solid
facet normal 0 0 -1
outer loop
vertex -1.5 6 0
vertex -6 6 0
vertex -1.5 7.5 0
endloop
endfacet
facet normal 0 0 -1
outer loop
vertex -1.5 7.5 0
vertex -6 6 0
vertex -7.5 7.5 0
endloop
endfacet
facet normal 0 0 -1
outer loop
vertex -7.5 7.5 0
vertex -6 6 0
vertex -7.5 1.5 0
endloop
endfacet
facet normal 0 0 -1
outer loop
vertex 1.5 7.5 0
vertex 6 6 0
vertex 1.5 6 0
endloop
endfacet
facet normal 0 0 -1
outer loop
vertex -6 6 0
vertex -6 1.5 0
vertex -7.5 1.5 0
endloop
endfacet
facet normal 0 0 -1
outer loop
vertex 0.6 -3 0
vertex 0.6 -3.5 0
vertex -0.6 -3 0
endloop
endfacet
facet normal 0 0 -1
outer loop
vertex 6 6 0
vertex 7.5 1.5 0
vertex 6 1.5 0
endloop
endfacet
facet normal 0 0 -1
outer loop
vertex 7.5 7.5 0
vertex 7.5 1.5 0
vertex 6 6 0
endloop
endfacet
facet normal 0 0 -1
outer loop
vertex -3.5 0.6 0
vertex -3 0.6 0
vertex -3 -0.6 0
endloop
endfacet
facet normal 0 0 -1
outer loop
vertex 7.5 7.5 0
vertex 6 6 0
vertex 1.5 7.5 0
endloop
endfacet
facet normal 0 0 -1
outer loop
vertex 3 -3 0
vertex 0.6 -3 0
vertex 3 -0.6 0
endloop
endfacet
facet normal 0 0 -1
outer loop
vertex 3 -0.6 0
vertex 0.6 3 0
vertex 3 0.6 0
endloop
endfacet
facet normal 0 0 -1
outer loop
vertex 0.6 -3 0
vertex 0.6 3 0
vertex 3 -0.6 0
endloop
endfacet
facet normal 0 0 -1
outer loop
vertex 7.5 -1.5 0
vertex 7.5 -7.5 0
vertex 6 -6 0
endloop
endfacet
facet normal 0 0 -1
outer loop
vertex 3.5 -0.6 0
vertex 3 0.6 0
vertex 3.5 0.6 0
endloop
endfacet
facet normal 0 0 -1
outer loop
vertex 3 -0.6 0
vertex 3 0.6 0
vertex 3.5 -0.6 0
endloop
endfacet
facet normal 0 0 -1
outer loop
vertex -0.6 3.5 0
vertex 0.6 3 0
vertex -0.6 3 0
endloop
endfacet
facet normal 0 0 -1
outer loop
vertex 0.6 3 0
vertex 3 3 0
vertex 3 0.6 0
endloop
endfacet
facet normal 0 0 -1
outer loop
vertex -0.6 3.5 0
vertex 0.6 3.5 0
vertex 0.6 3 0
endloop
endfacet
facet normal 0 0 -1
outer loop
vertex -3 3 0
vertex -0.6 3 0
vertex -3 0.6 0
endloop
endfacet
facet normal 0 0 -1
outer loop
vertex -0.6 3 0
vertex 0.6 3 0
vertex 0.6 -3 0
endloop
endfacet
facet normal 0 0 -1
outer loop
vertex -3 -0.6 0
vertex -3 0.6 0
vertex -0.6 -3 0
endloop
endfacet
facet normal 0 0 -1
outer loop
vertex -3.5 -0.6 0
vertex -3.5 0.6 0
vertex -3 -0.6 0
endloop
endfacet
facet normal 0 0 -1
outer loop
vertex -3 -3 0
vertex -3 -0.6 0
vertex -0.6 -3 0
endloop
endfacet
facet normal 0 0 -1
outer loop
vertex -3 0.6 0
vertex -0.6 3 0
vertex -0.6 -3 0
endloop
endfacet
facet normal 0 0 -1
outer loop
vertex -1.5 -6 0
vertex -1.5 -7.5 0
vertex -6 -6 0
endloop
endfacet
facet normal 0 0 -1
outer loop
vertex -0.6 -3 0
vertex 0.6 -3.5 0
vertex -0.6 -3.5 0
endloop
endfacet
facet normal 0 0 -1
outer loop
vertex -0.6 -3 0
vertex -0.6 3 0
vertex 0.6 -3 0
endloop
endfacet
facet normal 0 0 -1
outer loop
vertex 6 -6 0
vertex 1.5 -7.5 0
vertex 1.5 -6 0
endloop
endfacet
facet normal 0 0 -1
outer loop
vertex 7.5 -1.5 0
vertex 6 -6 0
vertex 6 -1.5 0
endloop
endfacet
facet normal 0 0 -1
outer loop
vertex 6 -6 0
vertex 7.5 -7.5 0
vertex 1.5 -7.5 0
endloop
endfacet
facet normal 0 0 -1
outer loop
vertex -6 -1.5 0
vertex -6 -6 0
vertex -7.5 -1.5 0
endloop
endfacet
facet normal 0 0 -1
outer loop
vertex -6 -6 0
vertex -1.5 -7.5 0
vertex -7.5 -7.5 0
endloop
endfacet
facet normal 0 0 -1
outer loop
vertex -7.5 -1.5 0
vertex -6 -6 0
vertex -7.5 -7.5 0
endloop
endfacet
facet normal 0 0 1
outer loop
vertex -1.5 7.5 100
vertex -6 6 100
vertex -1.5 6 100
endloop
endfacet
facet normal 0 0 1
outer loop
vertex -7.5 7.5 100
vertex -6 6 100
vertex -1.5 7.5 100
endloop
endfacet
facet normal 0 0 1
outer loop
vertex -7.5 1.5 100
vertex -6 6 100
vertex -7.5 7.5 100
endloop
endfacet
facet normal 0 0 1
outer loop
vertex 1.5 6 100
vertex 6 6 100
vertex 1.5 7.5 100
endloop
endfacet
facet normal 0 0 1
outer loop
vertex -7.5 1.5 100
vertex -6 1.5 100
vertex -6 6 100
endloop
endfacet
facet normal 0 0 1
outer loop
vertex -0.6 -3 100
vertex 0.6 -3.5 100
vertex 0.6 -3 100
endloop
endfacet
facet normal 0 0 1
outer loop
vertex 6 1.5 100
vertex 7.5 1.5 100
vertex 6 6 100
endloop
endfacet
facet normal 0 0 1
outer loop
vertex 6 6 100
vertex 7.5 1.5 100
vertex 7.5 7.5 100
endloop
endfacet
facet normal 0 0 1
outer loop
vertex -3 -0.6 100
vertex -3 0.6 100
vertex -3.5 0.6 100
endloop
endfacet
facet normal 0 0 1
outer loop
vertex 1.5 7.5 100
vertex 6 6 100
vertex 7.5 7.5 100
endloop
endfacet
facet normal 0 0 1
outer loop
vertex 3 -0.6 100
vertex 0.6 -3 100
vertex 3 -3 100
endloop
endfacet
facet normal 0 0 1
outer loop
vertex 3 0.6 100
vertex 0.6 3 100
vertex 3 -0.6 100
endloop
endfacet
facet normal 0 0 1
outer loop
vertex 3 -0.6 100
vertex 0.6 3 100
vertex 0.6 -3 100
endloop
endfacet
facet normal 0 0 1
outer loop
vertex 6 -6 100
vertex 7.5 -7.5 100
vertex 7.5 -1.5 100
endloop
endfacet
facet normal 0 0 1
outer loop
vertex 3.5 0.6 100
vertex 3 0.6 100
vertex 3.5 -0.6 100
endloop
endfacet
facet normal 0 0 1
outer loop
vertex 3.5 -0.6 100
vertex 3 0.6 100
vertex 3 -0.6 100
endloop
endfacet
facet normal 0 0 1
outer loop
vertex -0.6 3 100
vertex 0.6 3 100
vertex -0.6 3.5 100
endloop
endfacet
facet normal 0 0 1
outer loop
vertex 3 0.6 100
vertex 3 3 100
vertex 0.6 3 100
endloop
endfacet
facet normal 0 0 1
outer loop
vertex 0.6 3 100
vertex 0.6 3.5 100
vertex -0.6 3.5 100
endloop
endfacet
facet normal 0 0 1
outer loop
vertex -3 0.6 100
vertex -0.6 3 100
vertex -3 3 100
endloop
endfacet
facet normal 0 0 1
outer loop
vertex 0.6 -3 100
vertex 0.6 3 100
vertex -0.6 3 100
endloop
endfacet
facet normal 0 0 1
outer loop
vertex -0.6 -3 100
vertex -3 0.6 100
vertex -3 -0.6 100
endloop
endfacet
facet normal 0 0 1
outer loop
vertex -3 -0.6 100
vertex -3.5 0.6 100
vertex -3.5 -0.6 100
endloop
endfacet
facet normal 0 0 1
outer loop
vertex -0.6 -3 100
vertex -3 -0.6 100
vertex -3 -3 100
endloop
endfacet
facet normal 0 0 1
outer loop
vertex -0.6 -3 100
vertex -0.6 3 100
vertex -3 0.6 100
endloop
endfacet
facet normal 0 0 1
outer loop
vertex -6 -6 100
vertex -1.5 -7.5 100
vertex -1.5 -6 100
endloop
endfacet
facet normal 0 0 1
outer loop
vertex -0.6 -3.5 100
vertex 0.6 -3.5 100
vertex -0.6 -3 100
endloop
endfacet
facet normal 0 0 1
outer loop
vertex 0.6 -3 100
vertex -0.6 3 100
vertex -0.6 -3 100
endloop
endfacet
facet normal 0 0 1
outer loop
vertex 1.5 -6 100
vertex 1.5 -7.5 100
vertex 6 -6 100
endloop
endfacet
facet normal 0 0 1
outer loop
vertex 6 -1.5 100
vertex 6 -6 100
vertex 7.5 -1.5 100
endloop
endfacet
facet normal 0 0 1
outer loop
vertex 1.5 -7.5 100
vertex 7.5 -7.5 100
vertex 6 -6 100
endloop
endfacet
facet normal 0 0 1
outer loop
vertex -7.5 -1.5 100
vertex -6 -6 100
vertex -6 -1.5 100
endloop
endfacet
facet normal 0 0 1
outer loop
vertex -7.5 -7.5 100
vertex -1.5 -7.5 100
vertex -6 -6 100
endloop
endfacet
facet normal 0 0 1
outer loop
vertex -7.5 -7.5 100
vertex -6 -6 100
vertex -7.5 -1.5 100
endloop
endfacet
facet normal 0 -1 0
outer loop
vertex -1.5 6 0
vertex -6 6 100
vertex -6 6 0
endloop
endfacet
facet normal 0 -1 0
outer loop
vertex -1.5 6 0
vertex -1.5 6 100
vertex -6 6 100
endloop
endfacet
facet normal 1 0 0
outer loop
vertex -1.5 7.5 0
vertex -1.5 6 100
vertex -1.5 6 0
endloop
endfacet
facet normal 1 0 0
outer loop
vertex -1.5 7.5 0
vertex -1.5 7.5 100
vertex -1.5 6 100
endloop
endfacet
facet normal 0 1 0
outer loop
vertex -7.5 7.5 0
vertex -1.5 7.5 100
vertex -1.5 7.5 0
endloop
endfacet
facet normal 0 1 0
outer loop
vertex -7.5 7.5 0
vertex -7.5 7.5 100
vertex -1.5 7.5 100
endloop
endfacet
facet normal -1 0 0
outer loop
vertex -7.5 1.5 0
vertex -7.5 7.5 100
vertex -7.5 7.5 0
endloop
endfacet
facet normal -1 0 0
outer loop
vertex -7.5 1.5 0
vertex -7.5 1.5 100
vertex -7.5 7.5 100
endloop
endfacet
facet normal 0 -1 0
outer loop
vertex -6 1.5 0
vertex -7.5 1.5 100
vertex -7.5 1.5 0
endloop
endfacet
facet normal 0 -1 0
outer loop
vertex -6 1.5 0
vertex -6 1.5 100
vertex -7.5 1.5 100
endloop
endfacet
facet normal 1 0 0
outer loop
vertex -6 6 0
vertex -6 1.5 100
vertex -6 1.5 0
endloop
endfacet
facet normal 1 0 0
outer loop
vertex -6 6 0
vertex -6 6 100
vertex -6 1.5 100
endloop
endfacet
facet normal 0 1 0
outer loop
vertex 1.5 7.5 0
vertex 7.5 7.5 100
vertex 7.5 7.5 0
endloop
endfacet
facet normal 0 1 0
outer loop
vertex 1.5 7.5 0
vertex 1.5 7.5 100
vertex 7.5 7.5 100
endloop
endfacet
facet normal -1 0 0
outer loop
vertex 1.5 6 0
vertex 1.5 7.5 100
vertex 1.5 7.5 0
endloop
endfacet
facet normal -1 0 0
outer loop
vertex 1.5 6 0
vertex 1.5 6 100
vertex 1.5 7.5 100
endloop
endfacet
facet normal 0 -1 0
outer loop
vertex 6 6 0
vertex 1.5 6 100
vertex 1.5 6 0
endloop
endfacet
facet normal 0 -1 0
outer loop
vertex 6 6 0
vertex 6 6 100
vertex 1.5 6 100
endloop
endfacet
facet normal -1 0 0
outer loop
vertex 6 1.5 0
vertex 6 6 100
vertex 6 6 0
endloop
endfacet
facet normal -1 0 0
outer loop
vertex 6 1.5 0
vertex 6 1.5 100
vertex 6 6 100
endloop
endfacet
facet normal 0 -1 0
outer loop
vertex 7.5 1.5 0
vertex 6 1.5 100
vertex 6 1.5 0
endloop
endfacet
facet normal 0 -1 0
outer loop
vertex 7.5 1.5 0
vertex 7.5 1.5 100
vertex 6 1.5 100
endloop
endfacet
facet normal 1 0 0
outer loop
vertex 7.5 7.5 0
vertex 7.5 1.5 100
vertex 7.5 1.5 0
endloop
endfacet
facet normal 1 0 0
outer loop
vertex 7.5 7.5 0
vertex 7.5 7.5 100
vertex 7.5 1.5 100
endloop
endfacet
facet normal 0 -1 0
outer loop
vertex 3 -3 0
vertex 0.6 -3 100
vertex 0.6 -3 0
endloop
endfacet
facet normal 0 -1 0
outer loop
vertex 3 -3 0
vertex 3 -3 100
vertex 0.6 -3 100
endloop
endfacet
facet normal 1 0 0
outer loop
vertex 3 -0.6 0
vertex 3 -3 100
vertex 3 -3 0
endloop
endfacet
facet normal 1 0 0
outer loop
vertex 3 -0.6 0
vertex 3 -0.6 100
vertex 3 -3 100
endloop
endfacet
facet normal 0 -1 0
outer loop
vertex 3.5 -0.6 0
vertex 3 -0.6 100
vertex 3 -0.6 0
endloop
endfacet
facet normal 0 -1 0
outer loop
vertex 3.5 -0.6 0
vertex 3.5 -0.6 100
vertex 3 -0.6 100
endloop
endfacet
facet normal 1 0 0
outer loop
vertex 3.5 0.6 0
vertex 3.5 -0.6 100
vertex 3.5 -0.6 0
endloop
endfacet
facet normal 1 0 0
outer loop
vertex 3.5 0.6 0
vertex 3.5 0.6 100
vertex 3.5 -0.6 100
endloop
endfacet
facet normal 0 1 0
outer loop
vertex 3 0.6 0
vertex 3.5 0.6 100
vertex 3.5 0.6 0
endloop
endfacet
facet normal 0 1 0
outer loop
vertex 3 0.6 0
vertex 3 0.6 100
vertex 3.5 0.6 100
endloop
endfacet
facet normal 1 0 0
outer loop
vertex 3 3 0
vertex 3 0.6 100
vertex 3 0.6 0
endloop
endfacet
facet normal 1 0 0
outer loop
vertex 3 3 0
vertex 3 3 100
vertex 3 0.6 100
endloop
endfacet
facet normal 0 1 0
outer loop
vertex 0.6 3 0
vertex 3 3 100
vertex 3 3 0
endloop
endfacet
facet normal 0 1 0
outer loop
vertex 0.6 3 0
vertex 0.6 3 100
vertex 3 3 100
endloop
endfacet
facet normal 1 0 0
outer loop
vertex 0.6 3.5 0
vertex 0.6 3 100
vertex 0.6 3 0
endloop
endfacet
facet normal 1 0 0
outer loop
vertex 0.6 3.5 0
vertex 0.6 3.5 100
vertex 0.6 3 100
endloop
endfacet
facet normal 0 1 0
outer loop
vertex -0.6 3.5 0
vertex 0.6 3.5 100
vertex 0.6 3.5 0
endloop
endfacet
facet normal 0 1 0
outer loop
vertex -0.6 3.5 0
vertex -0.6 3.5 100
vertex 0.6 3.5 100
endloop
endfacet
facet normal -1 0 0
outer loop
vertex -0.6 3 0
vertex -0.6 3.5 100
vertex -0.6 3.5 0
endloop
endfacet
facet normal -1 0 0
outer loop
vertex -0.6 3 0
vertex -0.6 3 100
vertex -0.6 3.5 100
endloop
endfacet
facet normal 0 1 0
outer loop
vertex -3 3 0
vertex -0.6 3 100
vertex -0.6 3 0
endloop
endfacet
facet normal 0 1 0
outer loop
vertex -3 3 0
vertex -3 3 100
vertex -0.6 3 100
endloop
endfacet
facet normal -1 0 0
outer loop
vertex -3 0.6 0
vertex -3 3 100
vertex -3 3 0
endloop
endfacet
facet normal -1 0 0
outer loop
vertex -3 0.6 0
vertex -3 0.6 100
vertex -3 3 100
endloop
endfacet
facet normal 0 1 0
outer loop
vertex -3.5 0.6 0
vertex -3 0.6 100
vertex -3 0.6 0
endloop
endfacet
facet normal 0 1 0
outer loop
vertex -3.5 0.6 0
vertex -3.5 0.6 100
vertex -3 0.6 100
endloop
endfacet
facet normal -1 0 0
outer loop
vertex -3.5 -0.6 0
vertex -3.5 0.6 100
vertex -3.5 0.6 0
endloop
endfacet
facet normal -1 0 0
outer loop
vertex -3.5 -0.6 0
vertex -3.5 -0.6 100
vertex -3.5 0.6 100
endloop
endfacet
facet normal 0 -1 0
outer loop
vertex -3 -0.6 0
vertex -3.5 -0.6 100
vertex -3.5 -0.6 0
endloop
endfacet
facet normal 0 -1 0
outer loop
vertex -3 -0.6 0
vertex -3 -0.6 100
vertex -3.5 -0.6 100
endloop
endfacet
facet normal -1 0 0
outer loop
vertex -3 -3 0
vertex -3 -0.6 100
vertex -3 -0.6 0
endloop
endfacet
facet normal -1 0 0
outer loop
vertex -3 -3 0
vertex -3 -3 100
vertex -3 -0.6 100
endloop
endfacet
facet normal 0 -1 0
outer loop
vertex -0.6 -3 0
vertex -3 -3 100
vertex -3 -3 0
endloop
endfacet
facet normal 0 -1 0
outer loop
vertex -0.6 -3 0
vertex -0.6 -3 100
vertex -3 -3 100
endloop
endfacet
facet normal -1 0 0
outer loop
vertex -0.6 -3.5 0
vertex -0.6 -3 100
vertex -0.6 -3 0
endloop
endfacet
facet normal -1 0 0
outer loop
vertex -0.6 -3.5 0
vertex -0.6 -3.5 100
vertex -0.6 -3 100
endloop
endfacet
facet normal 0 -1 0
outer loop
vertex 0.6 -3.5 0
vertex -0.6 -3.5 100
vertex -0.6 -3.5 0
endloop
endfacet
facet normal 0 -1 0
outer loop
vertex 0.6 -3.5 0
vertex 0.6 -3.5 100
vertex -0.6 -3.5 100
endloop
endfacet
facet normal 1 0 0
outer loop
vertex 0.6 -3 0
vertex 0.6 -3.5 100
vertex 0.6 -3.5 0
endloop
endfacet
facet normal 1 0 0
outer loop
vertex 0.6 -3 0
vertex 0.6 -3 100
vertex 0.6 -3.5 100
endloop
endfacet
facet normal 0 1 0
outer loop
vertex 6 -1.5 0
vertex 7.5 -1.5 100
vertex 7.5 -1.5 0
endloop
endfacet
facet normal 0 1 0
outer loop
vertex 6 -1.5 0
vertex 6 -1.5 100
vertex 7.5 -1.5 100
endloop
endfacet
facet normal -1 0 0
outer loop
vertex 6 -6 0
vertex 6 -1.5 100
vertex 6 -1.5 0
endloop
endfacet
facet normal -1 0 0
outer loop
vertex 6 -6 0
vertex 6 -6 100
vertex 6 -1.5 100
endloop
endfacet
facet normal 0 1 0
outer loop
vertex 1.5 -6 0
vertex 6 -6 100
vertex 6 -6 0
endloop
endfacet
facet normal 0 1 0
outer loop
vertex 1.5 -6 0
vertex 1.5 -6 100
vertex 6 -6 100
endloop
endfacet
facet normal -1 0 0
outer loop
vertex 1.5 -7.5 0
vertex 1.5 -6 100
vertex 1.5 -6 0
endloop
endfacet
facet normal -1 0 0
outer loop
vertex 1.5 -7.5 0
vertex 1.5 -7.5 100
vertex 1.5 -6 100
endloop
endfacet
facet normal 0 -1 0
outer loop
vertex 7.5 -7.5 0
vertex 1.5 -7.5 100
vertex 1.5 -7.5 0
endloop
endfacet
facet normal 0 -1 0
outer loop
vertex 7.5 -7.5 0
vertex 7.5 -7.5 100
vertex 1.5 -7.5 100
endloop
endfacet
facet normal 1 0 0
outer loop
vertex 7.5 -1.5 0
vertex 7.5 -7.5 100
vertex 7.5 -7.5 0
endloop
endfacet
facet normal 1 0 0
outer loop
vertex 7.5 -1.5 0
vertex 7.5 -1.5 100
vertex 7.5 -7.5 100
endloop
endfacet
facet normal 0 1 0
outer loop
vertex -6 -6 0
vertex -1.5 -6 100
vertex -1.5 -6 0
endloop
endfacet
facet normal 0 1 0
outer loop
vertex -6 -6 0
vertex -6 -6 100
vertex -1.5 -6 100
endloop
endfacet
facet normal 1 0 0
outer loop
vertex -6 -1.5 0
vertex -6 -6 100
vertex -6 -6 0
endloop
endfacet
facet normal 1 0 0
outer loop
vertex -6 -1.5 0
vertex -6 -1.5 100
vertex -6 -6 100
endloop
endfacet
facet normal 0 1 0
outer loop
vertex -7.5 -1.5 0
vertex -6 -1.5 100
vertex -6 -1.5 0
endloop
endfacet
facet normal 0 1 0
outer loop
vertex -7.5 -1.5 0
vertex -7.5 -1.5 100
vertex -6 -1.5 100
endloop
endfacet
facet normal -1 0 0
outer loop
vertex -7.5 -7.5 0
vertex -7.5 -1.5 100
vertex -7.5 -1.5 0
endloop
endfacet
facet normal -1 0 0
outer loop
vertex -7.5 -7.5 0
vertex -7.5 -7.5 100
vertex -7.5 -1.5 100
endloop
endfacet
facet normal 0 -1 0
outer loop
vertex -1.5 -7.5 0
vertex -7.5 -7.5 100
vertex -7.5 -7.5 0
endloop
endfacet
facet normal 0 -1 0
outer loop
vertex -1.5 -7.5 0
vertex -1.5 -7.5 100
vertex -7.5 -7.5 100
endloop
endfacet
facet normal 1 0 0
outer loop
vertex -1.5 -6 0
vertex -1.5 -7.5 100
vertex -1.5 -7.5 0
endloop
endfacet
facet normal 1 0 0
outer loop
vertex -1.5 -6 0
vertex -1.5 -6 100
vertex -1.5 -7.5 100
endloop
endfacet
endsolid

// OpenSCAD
$fn = 64;

// 15x15mm aluminium extrusion profile, 100mm long (simplified 4x T-slot style)
size   = 15.0;   // outer width/height (mm)
length = 100.0;  // extrusion length (mm)

// Profile parameters (kept proportional and printable)
wall      = 1.5;  // outer wall thickness
slot_w    = 3.0;  // slot opening width at the surface
slot_d    = 4.0;  // slot depth from surface inward
core_size = 6.0;  // central solid core (keeps model one connected solid)
web_t     = 1.2;  // connecting web thickness from core to outer wall

eps = 0.02;

module extrusion_profile_2d() {
    // Build solid as: (outer ring + core + webs) minus (slot cuts)
    difference() {
        union() {
            // Outer ring (square tube)
            difference() {
                square([size, size], center=true);
                square([size - 2*wall, size - 2*wall], center=true);
            }

            // Central core
            square([core_size, core_size], center=true);

            // Four webs connecting core to the inner wall (ensures one connected solid)
            // Web length reaches to the inner wall plane at y = (size/2 - wall)
            web_len = (size/2 - wall) - core_size/2;
            for (a = [0:90:270]) {
                rotate(a)
                    translate([0, core_size/2 + web_len/2, 0])
                        square([web_t, web_len + 2*eps], center=true); // +eps ensures overlap
            }
        }

        // Four slot openings cut from each face inward
        for (a = [0:90:270]) {
            rotate(a)
                translate([0, size/2 - slot_d/2 + eps, 0])
                    square([slot_w, slot_d + 2*eps], center=true);
        }
    }
}

linear_extrude(height=length, center=false, convexity=10)
    extrusion_profile_2d();
